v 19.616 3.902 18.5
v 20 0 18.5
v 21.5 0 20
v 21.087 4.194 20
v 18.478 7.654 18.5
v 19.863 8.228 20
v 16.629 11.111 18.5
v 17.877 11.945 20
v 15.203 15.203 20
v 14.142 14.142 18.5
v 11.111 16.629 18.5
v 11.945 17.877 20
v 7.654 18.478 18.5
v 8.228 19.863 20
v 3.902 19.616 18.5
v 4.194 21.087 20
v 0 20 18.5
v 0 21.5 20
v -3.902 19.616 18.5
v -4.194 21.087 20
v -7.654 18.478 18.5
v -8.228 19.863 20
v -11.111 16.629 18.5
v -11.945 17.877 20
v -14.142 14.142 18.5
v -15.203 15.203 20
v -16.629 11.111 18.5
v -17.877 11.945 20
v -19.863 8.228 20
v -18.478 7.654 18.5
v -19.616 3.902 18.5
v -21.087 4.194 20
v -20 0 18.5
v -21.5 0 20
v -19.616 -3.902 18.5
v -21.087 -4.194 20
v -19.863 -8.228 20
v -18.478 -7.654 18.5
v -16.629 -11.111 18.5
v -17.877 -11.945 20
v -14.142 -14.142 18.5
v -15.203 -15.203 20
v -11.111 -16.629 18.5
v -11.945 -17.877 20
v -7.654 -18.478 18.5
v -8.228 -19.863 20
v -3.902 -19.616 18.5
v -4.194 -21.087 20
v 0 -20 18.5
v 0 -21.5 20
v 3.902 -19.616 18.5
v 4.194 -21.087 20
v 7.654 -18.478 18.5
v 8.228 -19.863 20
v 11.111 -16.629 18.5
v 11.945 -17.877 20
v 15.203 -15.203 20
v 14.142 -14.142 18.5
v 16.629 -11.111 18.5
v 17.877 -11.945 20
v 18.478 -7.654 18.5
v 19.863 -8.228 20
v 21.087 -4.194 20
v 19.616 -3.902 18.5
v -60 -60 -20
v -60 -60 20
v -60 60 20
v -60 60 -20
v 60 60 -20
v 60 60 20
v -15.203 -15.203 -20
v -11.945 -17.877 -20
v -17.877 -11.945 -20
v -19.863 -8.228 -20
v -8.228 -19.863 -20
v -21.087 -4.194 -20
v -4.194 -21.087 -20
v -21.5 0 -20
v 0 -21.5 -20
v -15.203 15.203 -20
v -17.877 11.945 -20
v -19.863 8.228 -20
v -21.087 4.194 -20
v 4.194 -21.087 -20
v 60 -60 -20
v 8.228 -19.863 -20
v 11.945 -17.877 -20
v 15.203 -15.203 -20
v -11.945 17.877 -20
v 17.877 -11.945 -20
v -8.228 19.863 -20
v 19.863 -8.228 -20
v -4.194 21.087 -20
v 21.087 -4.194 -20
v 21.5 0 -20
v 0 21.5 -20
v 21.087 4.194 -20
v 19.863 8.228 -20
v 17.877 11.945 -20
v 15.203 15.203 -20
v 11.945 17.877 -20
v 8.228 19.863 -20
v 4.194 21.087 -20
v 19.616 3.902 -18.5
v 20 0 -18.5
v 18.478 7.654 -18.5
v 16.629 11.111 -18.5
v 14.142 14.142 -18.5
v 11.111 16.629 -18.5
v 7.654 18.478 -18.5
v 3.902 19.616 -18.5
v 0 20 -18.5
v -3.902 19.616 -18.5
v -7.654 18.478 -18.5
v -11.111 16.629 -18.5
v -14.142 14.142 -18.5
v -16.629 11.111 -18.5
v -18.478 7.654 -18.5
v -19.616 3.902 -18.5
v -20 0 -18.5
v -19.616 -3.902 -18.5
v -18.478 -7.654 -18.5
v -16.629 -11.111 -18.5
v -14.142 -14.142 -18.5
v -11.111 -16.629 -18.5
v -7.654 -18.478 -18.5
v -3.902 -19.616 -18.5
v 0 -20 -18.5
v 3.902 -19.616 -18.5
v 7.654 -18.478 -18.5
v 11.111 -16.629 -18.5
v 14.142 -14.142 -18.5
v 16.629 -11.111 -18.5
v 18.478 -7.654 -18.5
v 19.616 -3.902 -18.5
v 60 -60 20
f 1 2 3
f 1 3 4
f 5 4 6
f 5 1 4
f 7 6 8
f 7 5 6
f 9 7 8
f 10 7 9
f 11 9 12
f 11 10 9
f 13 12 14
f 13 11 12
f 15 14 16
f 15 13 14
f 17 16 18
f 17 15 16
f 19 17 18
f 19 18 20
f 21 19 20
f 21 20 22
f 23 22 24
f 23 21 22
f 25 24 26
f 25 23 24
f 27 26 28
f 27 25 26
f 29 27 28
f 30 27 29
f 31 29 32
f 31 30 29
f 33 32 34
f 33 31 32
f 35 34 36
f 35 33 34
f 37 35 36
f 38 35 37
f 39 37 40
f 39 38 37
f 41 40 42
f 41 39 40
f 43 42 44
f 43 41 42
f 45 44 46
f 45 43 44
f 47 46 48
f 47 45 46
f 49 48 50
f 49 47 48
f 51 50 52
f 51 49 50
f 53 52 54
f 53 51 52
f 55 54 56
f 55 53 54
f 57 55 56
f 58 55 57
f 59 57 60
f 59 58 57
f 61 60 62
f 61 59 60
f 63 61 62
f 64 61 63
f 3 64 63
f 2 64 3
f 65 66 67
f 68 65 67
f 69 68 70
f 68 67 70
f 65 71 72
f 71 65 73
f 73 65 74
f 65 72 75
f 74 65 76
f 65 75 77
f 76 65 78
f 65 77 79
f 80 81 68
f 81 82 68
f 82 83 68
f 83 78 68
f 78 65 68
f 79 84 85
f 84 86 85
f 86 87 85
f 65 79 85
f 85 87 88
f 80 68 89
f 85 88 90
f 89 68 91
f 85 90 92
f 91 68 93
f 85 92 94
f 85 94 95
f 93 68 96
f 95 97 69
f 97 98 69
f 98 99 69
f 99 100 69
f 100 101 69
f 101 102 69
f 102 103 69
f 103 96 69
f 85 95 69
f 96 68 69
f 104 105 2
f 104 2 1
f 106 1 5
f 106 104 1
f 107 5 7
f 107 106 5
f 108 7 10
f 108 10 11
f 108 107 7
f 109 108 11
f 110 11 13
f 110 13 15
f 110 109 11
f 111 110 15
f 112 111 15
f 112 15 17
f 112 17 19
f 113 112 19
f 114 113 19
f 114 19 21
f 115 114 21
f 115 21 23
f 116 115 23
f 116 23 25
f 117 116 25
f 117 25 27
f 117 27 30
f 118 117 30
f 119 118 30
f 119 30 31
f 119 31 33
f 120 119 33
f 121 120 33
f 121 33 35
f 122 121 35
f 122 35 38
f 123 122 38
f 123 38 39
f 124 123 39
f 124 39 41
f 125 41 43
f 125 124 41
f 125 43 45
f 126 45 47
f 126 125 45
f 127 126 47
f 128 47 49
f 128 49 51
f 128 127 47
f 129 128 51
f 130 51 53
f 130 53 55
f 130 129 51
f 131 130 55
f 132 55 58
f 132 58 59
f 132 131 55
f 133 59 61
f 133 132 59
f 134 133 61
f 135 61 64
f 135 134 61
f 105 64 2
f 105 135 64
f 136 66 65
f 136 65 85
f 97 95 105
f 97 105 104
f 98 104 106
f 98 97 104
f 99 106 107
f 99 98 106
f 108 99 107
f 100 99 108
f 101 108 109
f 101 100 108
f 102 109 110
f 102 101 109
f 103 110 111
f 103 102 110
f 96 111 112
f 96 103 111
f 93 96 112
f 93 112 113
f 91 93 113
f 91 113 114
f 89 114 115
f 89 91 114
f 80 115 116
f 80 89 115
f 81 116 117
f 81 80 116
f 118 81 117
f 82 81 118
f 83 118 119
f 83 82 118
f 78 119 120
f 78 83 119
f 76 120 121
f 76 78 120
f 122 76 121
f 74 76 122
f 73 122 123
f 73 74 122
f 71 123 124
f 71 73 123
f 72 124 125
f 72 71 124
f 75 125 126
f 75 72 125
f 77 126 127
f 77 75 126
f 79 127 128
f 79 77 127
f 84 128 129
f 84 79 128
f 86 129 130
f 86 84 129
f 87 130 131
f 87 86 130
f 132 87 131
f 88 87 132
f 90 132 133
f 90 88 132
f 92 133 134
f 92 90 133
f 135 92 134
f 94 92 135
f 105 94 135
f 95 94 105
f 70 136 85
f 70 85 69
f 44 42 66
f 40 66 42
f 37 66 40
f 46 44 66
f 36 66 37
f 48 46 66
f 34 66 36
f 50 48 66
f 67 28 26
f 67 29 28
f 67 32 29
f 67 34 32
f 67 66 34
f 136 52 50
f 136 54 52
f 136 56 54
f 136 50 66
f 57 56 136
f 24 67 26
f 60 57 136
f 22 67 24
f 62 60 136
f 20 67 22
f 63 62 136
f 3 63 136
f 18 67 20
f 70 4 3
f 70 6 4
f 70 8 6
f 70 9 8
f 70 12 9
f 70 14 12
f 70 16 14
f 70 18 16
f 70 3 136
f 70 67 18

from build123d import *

# Parameters (mm, degrees)
SKETCH1_W          = 120
SKETCH1_H          = 120
SKETCH1_R          = 20
EXTRUDE1_DEPTH     = 20
FRAME_CHAMFER_SIZE = 1.5


with BuildPart() as part:
    # Sketch1 → Extrude1 (new body, symmetric)
    with BuildSketch(Plane.XY):
        Rectangle(SKETCH1_W, SKETCH1_H)
        Circle(SKETCH1_R, mode=Mode.SUBTRACT)
    extrude(amount=EXTRUDE1_DEPTH, both=True)

    # Frame Chamfer
    frame_chamfer_edges = [part.edges().sort_by_distance(p)[0] for p in [
        (-20, 0, -20),
        (-20, 0, 20),
    ]]
    chamfer(frame_chamfer_edges, length=FRAME_CHAMFER_SIZE)


solid = part.part
